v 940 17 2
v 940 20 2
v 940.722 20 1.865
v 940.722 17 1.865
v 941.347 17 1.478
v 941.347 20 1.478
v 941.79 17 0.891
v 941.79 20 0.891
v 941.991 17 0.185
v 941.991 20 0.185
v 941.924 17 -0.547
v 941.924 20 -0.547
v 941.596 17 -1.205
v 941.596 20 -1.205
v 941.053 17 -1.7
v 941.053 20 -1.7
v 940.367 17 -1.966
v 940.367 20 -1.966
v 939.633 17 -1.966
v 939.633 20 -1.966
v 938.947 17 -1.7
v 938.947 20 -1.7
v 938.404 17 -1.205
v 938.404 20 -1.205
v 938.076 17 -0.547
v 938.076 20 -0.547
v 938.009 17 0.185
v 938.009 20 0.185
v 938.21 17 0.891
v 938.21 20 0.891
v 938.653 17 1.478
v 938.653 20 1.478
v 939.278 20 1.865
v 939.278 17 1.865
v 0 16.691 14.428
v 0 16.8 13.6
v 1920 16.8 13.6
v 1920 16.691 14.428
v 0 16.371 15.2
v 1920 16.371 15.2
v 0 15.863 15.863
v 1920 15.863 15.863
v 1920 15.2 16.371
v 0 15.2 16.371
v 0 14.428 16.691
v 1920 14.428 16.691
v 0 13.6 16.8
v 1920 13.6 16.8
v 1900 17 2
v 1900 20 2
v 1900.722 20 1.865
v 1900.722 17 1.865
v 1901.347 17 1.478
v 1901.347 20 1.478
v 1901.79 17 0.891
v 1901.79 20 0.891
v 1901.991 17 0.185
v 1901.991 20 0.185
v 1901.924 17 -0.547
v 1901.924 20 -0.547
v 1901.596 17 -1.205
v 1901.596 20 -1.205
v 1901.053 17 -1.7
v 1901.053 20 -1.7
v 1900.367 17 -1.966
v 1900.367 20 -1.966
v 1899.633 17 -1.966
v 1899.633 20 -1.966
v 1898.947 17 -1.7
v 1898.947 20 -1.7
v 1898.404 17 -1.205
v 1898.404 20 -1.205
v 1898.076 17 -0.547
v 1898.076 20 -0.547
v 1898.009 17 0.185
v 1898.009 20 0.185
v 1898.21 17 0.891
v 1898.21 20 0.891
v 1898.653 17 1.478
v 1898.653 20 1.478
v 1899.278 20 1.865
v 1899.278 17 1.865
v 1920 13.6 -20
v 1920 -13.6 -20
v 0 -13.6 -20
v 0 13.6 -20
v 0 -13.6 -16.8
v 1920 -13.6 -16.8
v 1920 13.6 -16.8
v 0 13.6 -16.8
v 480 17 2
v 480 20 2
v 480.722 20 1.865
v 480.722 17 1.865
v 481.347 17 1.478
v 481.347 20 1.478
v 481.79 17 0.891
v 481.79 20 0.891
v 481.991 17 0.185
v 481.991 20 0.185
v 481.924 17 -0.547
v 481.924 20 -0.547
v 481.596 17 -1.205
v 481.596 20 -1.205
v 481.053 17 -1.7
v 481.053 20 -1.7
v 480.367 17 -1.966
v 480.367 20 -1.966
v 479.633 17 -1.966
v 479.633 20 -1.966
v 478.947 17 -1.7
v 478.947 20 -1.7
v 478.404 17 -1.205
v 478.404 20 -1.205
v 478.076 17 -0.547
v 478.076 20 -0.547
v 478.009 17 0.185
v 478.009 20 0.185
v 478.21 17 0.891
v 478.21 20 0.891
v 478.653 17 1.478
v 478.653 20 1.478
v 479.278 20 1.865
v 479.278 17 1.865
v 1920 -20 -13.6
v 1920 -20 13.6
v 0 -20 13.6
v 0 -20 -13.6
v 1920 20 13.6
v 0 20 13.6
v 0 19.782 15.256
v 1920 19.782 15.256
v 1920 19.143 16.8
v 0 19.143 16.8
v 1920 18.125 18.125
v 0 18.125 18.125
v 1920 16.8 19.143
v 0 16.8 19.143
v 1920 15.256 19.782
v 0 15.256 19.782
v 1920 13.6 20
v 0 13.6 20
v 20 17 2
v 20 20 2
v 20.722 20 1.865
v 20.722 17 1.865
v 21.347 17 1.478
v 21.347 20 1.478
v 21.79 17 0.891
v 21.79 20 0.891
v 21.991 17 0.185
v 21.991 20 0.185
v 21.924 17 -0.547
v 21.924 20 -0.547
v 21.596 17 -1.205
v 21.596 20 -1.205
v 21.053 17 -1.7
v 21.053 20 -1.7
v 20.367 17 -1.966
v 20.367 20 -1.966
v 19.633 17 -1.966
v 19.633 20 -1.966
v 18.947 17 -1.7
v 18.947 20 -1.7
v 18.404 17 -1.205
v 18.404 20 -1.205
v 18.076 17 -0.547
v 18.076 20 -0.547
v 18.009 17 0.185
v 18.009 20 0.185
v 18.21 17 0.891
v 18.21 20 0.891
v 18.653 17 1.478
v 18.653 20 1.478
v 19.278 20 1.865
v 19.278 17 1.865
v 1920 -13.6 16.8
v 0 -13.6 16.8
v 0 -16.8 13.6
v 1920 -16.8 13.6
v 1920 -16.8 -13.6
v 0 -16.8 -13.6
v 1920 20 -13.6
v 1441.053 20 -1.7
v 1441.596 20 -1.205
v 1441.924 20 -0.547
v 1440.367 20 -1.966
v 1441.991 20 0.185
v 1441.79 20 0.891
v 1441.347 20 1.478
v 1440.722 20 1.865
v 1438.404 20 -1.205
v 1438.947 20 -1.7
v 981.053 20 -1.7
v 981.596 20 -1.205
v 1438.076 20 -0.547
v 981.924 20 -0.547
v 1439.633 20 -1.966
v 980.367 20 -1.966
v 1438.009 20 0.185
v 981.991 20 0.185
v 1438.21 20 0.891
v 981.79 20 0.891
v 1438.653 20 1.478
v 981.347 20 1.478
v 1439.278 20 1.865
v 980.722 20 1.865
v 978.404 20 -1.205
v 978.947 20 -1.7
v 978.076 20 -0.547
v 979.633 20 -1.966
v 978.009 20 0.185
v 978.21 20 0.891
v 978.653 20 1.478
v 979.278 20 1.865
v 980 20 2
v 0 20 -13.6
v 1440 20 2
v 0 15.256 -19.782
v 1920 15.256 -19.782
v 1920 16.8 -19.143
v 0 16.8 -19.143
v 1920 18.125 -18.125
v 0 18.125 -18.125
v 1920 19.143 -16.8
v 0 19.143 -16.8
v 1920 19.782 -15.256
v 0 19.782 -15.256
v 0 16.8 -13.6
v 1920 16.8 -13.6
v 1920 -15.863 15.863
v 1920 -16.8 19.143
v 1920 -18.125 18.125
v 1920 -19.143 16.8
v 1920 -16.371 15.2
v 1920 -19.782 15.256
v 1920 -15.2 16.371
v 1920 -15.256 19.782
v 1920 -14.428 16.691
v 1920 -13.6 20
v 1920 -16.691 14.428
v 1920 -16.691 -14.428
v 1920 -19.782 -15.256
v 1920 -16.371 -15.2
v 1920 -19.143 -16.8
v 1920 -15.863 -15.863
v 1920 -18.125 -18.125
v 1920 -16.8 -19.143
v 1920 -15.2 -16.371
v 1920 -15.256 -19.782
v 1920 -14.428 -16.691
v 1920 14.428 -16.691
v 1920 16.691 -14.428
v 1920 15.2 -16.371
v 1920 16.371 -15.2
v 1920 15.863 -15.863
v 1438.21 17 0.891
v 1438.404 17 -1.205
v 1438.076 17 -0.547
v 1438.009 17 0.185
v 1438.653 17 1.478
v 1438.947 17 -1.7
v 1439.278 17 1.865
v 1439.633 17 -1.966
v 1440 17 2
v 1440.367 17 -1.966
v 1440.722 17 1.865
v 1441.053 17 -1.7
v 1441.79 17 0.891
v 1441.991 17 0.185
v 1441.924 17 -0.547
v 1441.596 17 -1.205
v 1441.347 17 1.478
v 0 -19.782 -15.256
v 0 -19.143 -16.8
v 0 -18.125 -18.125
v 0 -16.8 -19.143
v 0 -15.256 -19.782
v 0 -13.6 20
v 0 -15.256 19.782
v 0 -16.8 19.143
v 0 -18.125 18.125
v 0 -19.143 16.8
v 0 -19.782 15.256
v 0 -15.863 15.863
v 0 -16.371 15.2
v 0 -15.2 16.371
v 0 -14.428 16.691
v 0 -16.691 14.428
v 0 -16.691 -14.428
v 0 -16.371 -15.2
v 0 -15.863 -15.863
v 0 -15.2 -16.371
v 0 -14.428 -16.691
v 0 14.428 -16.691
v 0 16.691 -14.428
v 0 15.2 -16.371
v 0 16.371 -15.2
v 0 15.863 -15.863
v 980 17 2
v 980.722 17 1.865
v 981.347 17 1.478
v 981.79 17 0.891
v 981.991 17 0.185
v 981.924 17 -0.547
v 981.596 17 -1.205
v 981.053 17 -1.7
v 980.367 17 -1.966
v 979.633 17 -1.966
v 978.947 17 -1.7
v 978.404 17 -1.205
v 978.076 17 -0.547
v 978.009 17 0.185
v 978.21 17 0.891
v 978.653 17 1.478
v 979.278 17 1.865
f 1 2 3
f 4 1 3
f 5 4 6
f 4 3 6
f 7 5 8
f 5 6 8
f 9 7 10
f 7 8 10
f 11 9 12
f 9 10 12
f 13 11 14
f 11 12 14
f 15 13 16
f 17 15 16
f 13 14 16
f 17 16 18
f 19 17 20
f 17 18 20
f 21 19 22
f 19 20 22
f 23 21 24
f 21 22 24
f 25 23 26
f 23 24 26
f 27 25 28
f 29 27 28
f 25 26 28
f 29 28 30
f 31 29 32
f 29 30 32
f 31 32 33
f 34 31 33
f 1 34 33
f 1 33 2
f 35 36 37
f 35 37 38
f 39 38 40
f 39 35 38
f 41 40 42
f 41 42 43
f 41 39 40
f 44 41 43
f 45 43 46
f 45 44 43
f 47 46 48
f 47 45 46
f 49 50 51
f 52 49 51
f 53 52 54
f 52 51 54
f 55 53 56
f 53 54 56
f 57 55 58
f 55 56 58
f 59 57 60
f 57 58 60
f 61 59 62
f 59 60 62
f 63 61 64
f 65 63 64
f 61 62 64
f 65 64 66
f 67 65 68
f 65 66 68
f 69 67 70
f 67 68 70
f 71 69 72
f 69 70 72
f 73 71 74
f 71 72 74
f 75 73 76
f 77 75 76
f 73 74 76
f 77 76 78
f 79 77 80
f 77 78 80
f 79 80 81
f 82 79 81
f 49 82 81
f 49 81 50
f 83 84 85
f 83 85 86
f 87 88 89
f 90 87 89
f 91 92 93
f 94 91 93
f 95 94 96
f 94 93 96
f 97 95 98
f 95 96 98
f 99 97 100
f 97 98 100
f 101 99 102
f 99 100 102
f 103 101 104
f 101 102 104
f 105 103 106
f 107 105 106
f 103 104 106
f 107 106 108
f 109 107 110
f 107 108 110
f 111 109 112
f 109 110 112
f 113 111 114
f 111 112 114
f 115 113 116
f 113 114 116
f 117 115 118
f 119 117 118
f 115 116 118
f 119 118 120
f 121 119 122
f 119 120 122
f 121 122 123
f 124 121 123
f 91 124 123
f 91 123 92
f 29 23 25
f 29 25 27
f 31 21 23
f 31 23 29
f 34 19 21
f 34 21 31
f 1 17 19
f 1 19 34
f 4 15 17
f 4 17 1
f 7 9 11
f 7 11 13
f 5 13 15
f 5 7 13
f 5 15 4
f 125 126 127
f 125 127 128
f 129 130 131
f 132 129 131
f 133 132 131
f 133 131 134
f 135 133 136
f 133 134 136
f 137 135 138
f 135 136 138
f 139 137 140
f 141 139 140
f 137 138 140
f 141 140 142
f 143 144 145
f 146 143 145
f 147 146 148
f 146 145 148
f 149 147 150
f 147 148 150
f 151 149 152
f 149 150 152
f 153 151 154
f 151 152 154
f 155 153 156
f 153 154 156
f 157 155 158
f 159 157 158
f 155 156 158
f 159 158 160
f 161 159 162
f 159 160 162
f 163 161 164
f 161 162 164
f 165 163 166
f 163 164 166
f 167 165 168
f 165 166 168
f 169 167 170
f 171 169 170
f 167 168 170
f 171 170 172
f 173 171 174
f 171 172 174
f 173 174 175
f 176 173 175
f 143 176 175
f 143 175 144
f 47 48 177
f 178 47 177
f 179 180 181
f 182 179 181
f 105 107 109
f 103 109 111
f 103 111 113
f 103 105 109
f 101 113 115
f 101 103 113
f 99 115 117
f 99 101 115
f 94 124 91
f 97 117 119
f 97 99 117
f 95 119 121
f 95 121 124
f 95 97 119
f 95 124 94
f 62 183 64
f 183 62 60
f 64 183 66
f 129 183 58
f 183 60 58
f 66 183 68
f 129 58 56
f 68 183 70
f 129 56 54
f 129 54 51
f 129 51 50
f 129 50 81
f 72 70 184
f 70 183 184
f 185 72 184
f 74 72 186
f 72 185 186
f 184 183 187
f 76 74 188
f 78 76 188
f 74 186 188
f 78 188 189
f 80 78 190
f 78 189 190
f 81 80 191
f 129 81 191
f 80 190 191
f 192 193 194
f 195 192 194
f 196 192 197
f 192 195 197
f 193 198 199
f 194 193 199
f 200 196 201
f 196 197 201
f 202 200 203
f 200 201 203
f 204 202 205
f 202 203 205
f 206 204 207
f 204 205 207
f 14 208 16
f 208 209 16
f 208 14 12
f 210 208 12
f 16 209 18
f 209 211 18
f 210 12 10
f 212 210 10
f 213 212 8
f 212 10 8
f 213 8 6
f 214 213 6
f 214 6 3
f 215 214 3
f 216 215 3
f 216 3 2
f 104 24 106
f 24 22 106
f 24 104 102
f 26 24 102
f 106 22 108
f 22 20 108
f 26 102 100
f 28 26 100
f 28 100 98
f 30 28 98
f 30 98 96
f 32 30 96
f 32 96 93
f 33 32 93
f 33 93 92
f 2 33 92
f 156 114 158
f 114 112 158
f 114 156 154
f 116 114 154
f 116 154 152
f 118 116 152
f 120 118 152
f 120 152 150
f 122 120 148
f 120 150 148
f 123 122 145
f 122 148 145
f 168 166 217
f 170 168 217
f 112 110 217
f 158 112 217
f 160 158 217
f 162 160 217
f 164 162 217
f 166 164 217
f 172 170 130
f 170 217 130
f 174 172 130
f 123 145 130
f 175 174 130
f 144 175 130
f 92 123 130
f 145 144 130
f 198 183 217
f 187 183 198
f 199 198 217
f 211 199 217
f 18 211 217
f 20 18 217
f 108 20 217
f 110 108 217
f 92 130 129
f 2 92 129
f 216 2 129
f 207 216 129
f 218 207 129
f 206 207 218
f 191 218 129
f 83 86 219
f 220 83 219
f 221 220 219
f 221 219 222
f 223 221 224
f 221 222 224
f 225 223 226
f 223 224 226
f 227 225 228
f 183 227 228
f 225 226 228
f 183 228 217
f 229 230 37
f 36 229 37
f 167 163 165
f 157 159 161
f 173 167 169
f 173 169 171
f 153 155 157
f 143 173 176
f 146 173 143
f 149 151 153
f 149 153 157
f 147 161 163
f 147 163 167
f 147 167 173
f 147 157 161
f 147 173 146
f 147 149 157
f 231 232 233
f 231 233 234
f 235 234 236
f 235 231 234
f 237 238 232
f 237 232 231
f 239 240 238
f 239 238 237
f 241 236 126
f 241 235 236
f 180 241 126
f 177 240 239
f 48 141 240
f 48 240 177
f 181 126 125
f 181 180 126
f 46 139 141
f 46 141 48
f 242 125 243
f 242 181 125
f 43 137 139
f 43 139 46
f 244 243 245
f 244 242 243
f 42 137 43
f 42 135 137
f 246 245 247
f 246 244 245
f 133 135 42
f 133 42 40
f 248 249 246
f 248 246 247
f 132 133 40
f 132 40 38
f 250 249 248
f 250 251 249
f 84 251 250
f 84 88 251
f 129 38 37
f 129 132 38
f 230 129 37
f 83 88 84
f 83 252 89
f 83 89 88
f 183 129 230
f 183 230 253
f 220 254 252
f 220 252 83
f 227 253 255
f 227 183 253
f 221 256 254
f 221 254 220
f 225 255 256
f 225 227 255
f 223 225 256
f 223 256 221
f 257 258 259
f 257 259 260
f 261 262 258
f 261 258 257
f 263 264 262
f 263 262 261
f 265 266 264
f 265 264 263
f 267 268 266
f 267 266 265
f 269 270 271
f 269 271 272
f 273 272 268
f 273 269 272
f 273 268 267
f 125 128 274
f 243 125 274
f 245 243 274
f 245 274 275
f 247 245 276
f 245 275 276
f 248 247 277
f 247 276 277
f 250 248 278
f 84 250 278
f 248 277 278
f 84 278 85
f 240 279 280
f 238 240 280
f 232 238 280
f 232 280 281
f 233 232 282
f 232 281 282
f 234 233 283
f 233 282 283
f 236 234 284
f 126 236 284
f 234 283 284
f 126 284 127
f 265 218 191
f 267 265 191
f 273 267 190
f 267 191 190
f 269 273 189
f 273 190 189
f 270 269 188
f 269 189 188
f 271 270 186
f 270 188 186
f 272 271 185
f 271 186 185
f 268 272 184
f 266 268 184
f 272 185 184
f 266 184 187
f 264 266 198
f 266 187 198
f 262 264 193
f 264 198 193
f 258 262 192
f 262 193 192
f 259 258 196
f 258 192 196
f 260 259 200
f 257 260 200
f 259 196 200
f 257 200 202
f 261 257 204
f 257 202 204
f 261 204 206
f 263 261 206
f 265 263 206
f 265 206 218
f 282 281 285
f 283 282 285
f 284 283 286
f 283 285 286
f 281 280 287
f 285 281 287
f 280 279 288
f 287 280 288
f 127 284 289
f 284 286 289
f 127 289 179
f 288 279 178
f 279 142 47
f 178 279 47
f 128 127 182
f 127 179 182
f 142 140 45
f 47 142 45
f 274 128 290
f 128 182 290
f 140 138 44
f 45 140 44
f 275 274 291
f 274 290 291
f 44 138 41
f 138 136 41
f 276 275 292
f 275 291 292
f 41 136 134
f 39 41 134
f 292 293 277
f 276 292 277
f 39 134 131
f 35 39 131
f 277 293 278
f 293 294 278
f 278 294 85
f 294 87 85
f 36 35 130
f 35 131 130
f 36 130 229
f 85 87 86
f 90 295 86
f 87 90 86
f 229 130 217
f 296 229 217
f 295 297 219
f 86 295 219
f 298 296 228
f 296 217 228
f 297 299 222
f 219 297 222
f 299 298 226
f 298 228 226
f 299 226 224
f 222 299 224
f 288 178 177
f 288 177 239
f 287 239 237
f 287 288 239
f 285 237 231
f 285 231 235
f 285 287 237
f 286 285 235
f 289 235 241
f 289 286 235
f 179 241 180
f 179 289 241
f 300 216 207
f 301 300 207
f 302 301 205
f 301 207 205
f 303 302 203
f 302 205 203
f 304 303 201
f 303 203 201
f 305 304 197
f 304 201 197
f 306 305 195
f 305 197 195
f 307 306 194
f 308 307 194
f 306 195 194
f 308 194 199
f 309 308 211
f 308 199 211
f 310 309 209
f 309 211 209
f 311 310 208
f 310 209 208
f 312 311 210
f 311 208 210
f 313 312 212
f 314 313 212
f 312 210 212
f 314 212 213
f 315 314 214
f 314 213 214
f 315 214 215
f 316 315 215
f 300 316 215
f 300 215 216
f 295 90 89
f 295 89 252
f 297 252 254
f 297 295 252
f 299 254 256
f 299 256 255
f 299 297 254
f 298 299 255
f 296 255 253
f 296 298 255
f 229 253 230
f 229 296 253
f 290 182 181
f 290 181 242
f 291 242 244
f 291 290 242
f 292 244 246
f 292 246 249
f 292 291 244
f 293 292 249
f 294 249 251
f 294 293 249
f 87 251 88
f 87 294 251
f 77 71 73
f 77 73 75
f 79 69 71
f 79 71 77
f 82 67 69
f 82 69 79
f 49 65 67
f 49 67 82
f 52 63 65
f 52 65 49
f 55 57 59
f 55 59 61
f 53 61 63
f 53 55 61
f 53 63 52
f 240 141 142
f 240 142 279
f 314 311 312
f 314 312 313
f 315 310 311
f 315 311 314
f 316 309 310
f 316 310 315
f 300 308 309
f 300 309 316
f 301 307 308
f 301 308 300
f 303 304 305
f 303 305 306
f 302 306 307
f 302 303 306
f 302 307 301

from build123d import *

# Parameters (mm, degrees)
TUBE_SQUARE_40_X_40_X_3_2_4_DEPTH = 1920
SKETCH13_R                        = 2
CUT_EXTRUDE1_DEPTH                = 3


with BuildPart() as part:
    # Sketch12 → Tube (square) 40 X 40 X 3.2(4) (new body)
    with BuildSketch(Plane(origin=(0, 0, 0), x_dir=(0, 0, -1), z_dir=(1, 0, 0))):
        with BuildLine():
            Line((-13.6, -20), (13.6, -20))
            ThreePointArc((13.6, -20), (18.1254834, -18.1254834), (20, -13.6))
            Line((20, -13.6), (20, 13.6))
            ThreePointArc((20, 13.6), (18.1254834, 18.1254834), (13.6, 20))
            Line((13.6, 20), (-13.6, 20))
            ThreePointArc((-13.6, 20), (-18.1254834, 18.1254834), (-20, 13.6))
            Line((-20, 13.6), (-20, -13.6))
            ThreePointArc((-20, -13.6), (-18.1254834, -18.1254834), (-13.6, -20))
        make_face()
        with BuildLine():
            Line((-13.6, -16.8), (13.6, -16.8))
            ThreePointArc((13.6, -16.8), (15.8627417, -15.8627417), (16.8, -13.6))
            Line((16.8, -13.6), (16.8, 13.6))
            ThreePointArc((16.8, 13.6), (15.8627417, 15.8627417), (13.6, 16.8))
            Line((13.6, 16.8), (-13.6, 16.8))
            ThreePointArc((-13.6, 16.8), (-15.8627417, 15.8627417), (-16.8, 13.6))
            Line((-16.8, 13.6), (-16.8, -13.6))
            ThreePointArc((-16.8, -13.6), (-15.8627417, -15.8627417), (-13.6, -16.8))
        make_face(mode=Mode.SUBTRACT)
    extrude(amount=TUBE_SQUARE_40_X_40_X_3_2_4_DEPTH)

    # Sketch13 → Cut-Extrude1 (cut)
    with BuildSketch(Plane(origin=(0, 20, 0), x_dir=(1, 0, 0), z_dir=(0, 1, 0))):
        with Locations(Location((20, 0, 0), (0, 0, 270))):
            Circle(SKETCH13_R)
        with Locations(Location((1900, 0, 0), (0, 0, 270))):
            Circle(SKETCH13_R)
        with Locations(Location((980, 0, 0), (0, 0, 270))):
            Circle(SKETCH13_R)
        with Locations(Location((940, 0, 0), (0, 0, 270))):
            Circle(SKETCH13_R)
        with Locations(Location((1440, 0, 0), (0, 0, 270))):
            Circle(SKETCH13_R)
        with Locations(Location((480, 0, 0), (0, 0, 270))):
            Circle(SKETCH13_R)
    extrude(amount=-CUT_EXTRUDE1_DEPTH, mode=Mode.SUBTRACT)


solid = part.part
